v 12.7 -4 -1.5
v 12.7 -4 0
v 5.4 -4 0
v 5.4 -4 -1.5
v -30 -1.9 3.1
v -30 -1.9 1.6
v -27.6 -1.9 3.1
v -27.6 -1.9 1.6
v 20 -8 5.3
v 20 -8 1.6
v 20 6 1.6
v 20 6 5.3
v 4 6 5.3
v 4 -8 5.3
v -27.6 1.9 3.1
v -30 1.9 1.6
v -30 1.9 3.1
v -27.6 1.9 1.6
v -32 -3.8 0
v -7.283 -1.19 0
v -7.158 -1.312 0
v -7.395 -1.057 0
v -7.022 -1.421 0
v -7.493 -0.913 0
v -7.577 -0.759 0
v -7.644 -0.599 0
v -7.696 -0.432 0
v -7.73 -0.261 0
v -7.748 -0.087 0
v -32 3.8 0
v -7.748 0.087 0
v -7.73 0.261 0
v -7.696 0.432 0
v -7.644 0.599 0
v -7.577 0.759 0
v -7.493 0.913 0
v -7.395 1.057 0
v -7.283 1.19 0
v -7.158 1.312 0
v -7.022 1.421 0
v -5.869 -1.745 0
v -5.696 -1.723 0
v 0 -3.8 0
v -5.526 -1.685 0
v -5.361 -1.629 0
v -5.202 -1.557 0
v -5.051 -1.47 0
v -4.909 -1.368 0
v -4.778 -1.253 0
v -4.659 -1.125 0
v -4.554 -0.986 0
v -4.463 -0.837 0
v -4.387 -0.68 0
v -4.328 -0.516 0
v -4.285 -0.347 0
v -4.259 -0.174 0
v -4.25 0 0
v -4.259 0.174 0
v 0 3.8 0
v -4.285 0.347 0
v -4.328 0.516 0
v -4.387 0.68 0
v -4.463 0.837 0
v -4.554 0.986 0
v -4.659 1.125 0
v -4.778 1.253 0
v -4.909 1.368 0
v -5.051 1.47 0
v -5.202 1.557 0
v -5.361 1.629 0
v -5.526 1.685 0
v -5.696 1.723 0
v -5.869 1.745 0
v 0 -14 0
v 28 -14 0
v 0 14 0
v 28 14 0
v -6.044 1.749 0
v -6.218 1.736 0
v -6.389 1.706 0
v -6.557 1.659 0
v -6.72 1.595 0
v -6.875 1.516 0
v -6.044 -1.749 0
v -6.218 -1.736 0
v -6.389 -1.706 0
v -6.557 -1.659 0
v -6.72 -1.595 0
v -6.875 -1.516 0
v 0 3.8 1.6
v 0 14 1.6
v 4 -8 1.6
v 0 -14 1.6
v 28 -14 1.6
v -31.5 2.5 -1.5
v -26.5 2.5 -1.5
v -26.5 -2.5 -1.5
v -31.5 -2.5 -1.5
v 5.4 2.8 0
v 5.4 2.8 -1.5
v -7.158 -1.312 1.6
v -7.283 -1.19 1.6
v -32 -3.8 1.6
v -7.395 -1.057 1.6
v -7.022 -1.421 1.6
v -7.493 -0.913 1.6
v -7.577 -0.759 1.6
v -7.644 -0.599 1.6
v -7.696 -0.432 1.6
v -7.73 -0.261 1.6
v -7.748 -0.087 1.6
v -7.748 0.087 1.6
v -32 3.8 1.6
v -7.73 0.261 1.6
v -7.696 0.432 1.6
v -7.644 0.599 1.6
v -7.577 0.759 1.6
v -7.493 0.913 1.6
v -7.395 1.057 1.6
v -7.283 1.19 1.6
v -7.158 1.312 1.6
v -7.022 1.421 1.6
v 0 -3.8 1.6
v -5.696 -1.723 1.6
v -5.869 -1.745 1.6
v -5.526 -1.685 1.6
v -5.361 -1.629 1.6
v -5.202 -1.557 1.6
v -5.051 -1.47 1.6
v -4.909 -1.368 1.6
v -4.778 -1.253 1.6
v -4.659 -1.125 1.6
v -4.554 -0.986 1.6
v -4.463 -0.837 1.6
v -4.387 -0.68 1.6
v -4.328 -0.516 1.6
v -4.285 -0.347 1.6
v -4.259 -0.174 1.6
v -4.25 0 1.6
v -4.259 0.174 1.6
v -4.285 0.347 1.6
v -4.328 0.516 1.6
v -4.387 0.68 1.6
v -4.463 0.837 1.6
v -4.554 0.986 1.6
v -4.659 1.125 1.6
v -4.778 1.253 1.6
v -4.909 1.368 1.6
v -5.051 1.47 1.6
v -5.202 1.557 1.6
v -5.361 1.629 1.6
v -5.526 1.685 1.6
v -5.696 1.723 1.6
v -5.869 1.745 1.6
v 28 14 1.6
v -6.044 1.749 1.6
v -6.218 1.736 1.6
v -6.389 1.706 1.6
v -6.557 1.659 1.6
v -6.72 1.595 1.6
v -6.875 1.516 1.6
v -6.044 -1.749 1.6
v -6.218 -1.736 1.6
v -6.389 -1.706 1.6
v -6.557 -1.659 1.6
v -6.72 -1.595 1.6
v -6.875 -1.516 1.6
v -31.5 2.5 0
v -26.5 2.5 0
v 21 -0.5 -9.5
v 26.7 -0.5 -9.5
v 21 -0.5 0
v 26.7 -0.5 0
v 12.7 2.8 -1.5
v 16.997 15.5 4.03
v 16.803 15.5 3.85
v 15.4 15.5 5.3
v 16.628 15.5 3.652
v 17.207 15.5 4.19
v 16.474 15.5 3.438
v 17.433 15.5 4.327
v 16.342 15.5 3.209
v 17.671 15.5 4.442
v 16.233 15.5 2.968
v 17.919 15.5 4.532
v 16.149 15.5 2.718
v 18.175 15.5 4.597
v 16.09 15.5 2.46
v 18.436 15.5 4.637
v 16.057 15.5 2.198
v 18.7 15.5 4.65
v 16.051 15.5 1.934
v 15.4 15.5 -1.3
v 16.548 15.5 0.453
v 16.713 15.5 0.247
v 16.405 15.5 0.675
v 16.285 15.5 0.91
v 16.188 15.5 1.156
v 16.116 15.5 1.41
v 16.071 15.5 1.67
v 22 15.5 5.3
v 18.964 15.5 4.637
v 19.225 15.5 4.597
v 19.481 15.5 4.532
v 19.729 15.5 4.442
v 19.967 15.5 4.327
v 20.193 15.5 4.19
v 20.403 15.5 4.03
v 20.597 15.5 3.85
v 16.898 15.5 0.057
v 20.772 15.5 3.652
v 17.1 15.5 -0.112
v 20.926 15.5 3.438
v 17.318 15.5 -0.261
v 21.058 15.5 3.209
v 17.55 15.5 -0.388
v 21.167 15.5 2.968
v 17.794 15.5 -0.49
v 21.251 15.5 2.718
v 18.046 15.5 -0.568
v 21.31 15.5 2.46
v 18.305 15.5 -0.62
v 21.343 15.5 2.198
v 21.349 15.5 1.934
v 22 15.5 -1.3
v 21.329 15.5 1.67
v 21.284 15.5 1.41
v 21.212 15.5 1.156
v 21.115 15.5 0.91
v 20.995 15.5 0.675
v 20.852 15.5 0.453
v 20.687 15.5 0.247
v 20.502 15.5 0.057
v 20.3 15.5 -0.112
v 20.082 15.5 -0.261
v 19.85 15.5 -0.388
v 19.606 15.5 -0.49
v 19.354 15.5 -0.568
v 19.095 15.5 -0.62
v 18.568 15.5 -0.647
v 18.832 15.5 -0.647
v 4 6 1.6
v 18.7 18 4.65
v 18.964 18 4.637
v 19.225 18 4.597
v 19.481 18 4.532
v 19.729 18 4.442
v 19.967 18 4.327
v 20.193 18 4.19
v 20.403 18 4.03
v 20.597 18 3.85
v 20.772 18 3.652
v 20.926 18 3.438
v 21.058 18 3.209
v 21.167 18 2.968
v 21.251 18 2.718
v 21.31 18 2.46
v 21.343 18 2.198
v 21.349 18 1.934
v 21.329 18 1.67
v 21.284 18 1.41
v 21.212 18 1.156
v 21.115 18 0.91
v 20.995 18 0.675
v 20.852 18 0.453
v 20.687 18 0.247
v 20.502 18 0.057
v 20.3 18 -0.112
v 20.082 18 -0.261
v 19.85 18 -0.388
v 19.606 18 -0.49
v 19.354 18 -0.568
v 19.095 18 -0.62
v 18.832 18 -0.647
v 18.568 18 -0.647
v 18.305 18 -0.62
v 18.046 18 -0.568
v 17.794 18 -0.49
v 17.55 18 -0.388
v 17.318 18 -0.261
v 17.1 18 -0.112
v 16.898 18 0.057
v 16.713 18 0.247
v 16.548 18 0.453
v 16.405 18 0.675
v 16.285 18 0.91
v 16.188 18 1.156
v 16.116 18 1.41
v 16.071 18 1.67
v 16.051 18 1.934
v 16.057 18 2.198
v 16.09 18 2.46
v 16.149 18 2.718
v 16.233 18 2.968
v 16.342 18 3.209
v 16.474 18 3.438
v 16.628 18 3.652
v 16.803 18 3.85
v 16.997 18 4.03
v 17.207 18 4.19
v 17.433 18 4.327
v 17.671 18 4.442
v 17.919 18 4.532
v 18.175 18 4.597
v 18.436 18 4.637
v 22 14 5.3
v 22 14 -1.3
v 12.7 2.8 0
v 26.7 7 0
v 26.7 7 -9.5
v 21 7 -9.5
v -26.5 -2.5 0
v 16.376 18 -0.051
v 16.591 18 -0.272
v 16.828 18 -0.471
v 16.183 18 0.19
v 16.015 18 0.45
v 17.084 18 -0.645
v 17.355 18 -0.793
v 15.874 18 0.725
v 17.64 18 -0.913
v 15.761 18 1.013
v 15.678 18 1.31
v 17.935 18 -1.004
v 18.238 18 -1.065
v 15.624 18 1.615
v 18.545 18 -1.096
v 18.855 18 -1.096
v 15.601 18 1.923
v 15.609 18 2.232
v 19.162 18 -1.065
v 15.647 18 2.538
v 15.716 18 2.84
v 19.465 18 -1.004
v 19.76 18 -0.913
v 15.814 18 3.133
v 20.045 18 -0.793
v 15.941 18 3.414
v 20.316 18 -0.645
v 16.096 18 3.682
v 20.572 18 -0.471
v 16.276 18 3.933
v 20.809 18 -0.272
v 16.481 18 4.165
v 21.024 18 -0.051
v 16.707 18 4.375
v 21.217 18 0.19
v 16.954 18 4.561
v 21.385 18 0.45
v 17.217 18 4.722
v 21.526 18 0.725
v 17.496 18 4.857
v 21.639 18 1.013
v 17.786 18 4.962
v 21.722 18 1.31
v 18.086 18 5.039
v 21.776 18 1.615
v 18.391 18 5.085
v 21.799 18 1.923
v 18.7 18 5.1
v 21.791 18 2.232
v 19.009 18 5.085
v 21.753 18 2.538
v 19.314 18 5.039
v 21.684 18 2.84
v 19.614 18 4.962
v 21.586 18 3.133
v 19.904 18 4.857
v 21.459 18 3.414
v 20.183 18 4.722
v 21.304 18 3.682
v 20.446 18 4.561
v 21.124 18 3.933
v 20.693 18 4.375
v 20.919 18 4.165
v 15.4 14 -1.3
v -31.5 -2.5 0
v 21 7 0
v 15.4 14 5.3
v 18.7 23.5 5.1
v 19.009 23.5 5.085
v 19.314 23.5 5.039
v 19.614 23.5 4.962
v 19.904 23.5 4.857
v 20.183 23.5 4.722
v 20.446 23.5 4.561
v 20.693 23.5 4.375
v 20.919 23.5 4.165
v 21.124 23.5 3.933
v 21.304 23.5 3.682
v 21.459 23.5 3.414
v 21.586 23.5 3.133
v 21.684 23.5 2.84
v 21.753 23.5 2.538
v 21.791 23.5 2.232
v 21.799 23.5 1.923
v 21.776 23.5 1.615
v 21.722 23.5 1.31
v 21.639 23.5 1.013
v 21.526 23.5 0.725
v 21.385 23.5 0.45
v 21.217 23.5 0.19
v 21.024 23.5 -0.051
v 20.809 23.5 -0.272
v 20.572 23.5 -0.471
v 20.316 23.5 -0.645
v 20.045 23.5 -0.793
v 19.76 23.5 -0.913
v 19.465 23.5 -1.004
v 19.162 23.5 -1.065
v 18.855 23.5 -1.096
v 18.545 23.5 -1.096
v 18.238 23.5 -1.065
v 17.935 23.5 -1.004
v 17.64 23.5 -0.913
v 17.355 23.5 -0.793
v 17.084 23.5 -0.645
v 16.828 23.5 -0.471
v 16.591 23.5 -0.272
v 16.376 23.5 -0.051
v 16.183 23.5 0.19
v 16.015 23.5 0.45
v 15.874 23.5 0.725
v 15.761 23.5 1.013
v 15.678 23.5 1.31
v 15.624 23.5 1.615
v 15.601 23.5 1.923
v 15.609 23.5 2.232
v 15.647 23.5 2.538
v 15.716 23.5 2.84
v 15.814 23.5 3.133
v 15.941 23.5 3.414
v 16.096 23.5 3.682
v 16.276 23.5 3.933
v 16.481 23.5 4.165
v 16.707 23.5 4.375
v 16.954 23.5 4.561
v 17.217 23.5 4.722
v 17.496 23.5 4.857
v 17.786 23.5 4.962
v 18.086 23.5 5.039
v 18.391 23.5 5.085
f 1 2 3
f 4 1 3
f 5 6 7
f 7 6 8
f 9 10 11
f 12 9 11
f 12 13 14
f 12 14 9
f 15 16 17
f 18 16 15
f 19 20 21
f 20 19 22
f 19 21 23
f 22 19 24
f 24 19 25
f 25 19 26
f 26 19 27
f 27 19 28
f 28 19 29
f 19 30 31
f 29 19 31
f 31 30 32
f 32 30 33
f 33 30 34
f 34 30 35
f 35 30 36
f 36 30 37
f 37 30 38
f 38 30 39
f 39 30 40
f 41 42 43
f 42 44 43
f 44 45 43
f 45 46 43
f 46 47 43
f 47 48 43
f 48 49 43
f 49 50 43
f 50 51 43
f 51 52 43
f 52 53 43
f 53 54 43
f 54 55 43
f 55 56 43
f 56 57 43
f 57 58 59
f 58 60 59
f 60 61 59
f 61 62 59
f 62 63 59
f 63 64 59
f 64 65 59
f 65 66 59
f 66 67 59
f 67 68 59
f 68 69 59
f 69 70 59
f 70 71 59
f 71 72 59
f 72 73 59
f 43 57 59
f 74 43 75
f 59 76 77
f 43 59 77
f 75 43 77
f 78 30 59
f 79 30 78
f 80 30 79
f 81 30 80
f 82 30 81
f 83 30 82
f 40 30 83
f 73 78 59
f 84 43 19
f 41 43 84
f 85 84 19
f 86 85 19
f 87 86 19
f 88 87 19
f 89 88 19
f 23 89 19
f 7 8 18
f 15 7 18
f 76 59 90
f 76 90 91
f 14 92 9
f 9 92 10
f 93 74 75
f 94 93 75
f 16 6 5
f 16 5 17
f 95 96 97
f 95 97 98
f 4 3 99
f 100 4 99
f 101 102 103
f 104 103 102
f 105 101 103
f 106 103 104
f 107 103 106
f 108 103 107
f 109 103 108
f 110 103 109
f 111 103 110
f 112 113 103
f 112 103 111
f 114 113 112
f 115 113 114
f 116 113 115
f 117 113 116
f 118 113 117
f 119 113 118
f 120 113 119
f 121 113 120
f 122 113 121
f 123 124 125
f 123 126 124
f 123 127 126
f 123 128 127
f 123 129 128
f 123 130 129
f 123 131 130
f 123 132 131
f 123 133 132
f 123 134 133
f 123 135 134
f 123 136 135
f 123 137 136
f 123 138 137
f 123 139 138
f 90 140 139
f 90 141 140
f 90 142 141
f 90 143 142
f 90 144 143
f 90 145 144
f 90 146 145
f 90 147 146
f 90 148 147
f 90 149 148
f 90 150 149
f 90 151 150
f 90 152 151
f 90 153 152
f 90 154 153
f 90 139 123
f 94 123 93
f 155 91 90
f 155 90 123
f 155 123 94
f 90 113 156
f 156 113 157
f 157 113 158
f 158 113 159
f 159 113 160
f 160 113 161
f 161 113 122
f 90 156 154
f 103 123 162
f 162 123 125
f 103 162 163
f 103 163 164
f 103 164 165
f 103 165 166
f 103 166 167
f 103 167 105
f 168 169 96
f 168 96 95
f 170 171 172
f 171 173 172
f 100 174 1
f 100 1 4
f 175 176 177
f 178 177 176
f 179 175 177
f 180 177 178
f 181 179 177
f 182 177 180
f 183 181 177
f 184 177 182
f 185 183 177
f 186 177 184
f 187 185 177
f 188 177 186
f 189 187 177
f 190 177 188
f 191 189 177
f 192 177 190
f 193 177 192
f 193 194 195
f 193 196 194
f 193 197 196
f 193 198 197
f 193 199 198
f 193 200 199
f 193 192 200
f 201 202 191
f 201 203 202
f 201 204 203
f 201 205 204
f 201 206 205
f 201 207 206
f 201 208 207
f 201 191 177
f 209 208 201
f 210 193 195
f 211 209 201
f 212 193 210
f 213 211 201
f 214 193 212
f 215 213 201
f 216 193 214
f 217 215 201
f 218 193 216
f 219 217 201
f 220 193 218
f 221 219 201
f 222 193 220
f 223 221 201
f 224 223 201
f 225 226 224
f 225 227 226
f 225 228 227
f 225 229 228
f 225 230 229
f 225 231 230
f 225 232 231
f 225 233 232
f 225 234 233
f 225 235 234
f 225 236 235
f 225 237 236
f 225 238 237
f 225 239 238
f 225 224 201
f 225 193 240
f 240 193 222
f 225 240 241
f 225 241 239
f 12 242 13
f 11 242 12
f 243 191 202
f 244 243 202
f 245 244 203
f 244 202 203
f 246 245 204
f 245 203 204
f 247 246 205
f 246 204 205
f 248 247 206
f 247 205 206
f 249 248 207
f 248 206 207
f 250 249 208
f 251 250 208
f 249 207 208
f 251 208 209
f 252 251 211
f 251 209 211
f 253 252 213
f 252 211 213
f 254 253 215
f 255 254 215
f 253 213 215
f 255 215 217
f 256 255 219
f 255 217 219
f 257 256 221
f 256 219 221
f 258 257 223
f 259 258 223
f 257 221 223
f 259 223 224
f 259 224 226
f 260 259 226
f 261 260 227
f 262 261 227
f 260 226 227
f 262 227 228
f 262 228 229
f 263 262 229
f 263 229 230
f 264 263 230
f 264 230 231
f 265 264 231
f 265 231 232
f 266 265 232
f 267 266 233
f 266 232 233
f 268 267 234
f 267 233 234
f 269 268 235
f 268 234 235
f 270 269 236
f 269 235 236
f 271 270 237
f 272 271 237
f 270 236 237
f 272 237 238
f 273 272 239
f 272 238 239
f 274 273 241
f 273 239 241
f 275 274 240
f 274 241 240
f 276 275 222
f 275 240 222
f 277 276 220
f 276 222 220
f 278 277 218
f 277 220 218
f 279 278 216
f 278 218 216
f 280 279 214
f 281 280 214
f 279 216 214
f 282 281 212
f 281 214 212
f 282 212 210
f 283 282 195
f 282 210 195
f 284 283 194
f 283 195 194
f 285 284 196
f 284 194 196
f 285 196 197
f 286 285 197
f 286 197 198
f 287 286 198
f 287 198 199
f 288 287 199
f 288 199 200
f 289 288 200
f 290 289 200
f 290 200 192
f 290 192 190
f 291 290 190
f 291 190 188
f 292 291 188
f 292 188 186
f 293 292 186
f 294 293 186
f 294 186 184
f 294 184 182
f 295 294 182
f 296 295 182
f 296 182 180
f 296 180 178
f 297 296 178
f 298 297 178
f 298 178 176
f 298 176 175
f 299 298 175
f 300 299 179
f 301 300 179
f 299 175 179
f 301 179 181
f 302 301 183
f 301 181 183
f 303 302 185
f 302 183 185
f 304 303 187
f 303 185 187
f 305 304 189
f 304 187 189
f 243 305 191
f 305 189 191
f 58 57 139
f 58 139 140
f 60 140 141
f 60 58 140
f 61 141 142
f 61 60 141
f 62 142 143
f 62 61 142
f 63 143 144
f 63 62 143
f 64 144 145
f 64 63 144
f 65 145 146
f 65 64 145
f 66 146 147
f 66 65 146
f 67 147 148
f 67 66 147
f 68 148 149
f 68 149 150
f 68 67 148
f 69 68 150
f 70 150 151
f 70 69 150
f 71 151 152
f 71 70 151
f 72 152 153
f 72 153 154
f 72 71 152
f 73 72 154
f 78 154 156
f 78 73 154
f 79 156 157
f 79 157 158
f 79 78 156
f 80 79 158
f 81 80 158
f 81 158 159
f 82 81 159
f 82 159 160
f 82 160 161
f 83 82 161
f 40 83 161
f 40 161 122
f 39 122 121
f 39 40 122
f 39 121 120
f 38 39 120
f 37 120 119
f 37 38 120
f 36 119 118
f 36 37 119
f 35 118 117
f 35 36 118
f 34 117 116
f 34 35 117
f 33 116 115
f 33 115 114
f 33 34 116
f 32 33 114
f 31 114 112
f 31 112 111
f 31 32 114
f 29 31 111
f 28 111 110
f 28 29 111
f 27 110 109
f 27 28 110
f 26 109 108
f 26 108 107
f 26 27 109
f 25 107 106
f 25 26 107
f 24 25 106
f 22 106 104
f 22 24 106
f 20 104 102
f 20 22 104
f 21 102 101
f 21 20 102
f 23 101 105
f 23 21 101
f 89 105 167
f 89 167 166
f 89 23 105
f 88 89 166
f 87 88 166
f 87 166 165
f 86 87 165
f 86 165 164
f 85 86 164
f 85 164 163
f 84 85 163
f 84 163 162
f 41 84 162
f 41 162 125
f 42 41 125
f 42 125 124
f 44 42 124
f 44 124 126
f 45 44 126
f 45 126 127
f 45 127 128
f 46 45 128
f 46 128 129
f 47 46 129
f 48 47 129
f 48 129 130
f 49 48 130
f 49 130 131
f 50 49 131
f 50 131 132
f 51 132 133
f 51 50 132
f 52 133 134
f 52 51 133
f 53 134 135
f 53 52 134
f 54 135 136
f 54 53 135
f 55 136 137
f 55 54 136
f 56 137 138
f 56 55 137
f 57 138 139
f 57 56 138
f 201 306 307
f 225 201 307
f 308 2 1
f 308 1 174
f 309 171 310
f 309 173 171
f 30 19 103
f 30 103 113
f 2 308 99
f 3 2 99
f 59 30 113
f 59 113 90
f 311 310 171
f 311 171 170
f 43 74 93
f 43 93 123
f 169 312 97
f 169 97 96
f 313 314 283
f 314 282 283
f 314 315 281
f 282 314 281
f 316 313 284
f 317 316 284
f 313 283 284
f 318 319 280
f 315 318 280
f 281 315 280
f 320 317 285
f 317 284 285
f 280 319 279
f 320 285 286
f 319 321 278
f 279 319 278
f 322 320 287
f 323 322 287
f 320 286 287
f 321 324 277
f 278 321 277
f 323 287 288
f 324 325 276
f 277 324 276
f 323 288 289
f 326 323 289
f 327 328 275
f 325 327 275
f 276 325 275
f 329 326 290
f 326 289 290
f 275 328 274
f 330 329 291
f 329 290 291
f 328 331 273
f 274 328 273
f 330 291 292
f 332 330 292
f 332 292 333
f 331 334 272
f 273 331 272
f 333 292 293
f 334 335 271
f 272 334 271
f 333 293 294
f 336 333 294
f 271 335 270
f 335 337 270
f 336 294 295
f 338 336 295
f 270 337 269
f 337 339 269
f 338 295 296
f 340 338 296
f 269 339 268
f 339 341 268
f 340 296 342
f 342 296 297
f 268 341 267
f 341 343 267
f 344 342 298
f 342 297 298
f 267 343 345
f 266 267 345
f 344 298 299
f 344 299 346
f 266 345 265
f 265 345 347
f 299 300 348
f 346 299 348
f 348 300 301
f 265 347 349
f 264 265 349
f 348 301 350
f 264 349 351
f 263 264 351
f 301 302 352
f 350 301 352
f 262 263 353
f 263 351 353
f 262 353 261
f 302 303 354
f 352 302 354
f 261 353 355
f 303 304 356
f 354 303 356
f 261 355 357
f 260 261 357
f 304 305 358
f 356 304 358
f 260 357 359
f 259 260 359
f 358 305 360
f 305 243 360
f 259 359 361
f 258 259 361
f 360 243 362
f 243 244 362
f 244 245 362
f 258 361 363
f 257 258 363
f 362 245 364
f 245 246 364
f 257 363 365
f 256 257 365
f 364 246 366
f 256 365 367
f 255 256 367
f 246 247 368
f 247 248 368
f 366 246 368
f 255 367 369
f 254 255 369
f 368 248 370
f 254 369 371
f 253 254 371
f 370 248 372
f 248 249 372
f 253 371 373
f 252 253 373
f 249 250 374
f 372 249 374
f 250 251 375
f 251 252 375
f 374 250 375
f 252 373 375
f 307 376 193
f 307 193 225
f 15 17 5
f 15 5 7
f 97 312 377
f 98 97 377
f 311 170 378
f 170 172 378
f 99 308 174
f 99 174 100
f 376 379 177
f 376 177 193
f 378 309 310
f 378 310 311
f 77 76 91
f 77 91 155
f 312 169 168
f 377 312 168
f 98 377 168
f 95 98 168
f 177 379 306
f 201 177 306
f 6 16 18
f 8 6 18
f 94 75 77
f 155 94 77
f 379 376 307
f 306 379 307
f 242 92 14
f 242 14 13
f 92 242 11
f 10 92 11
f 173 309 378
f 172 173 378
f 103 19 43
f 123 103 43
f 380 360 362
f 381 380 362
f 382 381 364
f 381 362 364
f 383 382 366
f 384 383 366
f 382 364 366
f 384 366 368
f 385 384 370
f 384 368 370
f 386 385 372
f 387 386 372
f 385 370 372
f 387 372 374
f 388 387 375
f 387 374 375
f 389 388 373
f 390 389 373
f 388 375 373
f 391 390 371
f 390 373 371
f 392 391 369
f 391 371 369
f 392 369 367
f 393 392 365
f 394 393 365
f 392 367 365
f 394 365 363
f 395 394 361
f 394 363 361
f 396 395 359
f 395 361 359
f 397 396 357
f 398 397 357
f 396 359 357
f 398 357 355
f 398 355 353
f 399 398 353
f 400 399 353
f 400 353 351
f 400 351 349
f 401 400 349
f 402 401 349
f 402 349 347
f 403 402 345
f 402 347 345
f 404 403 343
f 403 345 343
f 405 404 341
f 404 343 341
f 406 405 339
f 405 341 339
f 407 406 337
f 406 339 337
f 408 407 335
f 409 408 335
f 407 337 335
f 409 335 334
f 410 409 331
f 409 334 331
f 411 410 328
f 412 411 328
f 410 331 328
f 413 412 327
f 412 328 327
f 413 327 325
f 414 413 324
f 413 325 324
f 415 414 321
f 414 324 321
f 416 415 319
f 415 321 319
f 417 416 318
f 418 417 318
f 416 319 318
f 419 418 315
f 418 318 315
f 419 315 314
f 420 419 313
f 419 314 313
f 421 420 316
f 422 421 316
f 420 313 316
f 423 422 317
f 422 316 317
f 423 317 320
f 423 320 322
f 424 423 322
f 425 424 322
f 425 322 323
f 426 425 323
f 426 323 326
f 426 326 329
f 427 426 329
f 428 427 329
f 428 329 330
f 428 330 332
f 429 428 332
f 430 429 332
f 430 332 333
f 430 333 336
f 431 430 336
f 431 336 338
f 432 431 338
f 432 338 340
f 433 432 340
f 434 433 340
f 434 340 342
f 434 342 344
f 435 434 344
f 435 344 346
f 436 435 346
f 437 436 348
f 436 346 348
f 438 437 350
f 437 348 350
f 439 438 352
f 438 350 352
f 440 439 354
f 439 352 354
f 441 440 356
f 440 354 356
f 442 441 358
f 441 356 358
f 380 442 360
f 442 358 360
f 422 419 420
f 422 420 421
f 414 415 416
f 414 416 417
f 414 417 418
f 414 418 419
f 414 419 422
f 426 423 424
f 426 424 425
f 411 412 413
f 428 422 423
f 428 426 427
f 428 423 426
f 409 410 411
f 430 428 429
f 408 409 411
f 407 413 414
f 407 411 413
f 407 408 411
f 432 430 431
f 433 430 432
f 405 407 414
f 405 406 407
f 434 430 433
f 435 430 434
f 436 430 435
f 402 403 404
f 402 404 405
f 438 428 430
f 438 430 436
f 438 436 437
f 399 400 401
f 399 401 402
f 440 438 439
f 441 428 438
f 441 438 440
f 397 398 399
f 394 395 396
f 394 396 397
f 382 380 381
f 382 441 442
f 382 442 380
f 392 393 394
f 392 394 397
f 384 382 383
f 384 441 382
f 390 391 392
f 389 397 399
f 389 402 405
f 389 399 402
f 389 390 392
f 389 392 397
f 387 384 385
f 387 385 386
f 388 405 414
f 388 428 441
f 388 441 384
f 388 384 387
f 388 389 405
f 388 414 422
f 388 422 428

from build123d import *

# Parameters (mm, degrees)
SKETCH1_W             = 28
SKETCH1_H             = 28
SKETCH1_W_2           = 32
SKETCH1_H_2           = 7.6
SKETCH1_R             = 1.75
BOSS_EXTRUDE1_DEPTH   = 1.6
SKETCH2_W             = 6.6
SKETCH2_H             = 6.6
BOSS_EXTRUDE2_DEPTH   = 1.5
SKETCH3_R             = 2.65
BOSS_EXTRUDE3_DEPTH   = 2.5
SKETCH4_R             = 3.1
BOSS_EXTRUDE4_DEPTH   = 5.5
SKETCH5_W             = 16
SKETCH5_H             = 14
BOSS_EXTRUDE5_DEPTH   = 3.7
SKETCH6_W             = 2.4
SKETCH6_H             = 3.8
BOSS_EXTRUDE6_DEPTH   = 1.5
SKETCH7_W             = 5.7
SKETCH7_H             = 7.5
BOSS_EXTRUDE7_DEPTH   = 1.5
SKETCH7_W_2           = 7.3
SKETCH7_H_2           = 6.8
BOSS_EXTRUDE7_2_DEPTH = 1.5
SKETCH7_W_3           = 5
SKETCH7_H_3           = 5
BOSS_EXTRUDE7_3_DEPTH = 1.5
MOVE_FACE2_BY         = 8


with BuildPart() as part:
    # Sketch1 → Boss-Extrude1 (new body)
    with BuildSketch(Plane.XY):
        with Locations((14, 0)):
            Rectangle(SKETCH1_W, SKETCH1_H)
        with Locations((-16, 0)):
            Rectangle(SKETCH1_W_2, SKETCH1_H_2)
        with Locations((-6, 0)):
            Circle(SKETCH1_R, mode=Mode.SUBTRACT)
    extrude(amount=BOSS_EXTRUDE1_DEPTH)


with BuildPart() as body_2:
    # Sketch2 → Boss-Extrude2 (new body)
    with BuildSketch(Plane(origin=(0, 14, 0), x_dir=(1, 0, 0), z_dir=(0, 1, 0))):
        with Locations((18.7, -2)):
            Rectangle(SKETCH2_W, SKETCH2_H)
    extrude(amount=BOSS_EXTRUDE2_DEPTH)

    # Sketch3 → Boss-Extrude3 (add)
    with BuildSketch(Plane(origin=(0, 15.5, 0), x_dir=(1, 0, 0), z_dir=(0, 1, 0))):
        with Locations(Location((18.7, -2, 0), (0, 0, 270))):
            Circle(SKETCH3_R)
    extrude(amount=BOSS_EXTRUDE3_DEPTH)

    # Sketch4 → Boss-Extrude4 (add)
    with BuildSketch(Plane(origin=(0, 18, 0), x_dir=(1, 0, 0), z_dir=(0, 1, 0))):
        with Locations(Location((18.7, -2, 0), (0, 0, 270))):
            Circle(SKETCH4_R)
    extrude(amount=BOSS_EXTRUDE4_DEPTH)


with BuildPart() as body_3:
    # Sketch5 → Boss-Extrude5 (new body)
    with BuildSketch(Plane.XY.offset(1.6)):
        with Locations((12, -1)):
            Rectangle(SKETCH5_W, SKETCH5_H)
    extrude(amount=BOSS_EXTRUDE5_DEPTH)


with BuildPart() as body_4:
    # Sketch6 → Boss-Extrude6 (new body)
    with BuildSketch(Plane.XY.offset(1.6)):
        with Locations((-28.8, 0)):
            Rectangle(SKETCH6_W, SKETCH6_H)
    extrude(amount=BOSS_EXTRUDE6_DEPTH)


with BuildPart() as body_5:
    # Sketch7 → Boss-Extrude7 (new body)
    with BuildSketch(Plane(origin=(0, 0, 0), x_dir=(-1, 0, 0), z_dir=(0, 0, -1))):
        with Locations((-23.85, 3.25)):
            Rectangle(SKETCH7_W, SKETCH7_H)
    extrude(amount=BOSS_EXTRUDE7_DEPTH)

    # Move Face2: a face moved outward by 8.0
    extrude(body_5.faces().sort_by_distance((23.85, 3.25, -1.5))[0], amount=MOVE_FACE2_BY, dir=(0, 0, -1))


with BuildPart() as body_6:
    # Sketch7 → Boss-Extrude7 2 (new body)
    with BuildSketch(Plane(origin=(0, 0, 0), x_dir=(-1, 0, 0), z_dir=(0, 0, -1))):
        with Locations((-9.05, -0.6)):
            Rectangle(SKETCH7_W_2, SKETCH7_H_2)
    extrude(amount=BOSS_EXTRUDE7_2_DEPTH)


with BuildPart() as body_7:
    # Sketch7 → Boss-Extrude7 3 (new body)
    with BuildSketch(Plane(origin=(0, 0, 0), x_dir=(-1, 0, 0), z_dir=(0, 0, -1))):
        with Locations((29, 0)):
            Rectangle(SKETCH7_W_3, SKETCH7_H_3)
    extrude(amount=BOSS_EXTRUDE7_3_DEPTH)


solid = Compound([part.part, body_2.part, body_3.part, body_4.part, body_5.part, body_6.part, body_7.part])
